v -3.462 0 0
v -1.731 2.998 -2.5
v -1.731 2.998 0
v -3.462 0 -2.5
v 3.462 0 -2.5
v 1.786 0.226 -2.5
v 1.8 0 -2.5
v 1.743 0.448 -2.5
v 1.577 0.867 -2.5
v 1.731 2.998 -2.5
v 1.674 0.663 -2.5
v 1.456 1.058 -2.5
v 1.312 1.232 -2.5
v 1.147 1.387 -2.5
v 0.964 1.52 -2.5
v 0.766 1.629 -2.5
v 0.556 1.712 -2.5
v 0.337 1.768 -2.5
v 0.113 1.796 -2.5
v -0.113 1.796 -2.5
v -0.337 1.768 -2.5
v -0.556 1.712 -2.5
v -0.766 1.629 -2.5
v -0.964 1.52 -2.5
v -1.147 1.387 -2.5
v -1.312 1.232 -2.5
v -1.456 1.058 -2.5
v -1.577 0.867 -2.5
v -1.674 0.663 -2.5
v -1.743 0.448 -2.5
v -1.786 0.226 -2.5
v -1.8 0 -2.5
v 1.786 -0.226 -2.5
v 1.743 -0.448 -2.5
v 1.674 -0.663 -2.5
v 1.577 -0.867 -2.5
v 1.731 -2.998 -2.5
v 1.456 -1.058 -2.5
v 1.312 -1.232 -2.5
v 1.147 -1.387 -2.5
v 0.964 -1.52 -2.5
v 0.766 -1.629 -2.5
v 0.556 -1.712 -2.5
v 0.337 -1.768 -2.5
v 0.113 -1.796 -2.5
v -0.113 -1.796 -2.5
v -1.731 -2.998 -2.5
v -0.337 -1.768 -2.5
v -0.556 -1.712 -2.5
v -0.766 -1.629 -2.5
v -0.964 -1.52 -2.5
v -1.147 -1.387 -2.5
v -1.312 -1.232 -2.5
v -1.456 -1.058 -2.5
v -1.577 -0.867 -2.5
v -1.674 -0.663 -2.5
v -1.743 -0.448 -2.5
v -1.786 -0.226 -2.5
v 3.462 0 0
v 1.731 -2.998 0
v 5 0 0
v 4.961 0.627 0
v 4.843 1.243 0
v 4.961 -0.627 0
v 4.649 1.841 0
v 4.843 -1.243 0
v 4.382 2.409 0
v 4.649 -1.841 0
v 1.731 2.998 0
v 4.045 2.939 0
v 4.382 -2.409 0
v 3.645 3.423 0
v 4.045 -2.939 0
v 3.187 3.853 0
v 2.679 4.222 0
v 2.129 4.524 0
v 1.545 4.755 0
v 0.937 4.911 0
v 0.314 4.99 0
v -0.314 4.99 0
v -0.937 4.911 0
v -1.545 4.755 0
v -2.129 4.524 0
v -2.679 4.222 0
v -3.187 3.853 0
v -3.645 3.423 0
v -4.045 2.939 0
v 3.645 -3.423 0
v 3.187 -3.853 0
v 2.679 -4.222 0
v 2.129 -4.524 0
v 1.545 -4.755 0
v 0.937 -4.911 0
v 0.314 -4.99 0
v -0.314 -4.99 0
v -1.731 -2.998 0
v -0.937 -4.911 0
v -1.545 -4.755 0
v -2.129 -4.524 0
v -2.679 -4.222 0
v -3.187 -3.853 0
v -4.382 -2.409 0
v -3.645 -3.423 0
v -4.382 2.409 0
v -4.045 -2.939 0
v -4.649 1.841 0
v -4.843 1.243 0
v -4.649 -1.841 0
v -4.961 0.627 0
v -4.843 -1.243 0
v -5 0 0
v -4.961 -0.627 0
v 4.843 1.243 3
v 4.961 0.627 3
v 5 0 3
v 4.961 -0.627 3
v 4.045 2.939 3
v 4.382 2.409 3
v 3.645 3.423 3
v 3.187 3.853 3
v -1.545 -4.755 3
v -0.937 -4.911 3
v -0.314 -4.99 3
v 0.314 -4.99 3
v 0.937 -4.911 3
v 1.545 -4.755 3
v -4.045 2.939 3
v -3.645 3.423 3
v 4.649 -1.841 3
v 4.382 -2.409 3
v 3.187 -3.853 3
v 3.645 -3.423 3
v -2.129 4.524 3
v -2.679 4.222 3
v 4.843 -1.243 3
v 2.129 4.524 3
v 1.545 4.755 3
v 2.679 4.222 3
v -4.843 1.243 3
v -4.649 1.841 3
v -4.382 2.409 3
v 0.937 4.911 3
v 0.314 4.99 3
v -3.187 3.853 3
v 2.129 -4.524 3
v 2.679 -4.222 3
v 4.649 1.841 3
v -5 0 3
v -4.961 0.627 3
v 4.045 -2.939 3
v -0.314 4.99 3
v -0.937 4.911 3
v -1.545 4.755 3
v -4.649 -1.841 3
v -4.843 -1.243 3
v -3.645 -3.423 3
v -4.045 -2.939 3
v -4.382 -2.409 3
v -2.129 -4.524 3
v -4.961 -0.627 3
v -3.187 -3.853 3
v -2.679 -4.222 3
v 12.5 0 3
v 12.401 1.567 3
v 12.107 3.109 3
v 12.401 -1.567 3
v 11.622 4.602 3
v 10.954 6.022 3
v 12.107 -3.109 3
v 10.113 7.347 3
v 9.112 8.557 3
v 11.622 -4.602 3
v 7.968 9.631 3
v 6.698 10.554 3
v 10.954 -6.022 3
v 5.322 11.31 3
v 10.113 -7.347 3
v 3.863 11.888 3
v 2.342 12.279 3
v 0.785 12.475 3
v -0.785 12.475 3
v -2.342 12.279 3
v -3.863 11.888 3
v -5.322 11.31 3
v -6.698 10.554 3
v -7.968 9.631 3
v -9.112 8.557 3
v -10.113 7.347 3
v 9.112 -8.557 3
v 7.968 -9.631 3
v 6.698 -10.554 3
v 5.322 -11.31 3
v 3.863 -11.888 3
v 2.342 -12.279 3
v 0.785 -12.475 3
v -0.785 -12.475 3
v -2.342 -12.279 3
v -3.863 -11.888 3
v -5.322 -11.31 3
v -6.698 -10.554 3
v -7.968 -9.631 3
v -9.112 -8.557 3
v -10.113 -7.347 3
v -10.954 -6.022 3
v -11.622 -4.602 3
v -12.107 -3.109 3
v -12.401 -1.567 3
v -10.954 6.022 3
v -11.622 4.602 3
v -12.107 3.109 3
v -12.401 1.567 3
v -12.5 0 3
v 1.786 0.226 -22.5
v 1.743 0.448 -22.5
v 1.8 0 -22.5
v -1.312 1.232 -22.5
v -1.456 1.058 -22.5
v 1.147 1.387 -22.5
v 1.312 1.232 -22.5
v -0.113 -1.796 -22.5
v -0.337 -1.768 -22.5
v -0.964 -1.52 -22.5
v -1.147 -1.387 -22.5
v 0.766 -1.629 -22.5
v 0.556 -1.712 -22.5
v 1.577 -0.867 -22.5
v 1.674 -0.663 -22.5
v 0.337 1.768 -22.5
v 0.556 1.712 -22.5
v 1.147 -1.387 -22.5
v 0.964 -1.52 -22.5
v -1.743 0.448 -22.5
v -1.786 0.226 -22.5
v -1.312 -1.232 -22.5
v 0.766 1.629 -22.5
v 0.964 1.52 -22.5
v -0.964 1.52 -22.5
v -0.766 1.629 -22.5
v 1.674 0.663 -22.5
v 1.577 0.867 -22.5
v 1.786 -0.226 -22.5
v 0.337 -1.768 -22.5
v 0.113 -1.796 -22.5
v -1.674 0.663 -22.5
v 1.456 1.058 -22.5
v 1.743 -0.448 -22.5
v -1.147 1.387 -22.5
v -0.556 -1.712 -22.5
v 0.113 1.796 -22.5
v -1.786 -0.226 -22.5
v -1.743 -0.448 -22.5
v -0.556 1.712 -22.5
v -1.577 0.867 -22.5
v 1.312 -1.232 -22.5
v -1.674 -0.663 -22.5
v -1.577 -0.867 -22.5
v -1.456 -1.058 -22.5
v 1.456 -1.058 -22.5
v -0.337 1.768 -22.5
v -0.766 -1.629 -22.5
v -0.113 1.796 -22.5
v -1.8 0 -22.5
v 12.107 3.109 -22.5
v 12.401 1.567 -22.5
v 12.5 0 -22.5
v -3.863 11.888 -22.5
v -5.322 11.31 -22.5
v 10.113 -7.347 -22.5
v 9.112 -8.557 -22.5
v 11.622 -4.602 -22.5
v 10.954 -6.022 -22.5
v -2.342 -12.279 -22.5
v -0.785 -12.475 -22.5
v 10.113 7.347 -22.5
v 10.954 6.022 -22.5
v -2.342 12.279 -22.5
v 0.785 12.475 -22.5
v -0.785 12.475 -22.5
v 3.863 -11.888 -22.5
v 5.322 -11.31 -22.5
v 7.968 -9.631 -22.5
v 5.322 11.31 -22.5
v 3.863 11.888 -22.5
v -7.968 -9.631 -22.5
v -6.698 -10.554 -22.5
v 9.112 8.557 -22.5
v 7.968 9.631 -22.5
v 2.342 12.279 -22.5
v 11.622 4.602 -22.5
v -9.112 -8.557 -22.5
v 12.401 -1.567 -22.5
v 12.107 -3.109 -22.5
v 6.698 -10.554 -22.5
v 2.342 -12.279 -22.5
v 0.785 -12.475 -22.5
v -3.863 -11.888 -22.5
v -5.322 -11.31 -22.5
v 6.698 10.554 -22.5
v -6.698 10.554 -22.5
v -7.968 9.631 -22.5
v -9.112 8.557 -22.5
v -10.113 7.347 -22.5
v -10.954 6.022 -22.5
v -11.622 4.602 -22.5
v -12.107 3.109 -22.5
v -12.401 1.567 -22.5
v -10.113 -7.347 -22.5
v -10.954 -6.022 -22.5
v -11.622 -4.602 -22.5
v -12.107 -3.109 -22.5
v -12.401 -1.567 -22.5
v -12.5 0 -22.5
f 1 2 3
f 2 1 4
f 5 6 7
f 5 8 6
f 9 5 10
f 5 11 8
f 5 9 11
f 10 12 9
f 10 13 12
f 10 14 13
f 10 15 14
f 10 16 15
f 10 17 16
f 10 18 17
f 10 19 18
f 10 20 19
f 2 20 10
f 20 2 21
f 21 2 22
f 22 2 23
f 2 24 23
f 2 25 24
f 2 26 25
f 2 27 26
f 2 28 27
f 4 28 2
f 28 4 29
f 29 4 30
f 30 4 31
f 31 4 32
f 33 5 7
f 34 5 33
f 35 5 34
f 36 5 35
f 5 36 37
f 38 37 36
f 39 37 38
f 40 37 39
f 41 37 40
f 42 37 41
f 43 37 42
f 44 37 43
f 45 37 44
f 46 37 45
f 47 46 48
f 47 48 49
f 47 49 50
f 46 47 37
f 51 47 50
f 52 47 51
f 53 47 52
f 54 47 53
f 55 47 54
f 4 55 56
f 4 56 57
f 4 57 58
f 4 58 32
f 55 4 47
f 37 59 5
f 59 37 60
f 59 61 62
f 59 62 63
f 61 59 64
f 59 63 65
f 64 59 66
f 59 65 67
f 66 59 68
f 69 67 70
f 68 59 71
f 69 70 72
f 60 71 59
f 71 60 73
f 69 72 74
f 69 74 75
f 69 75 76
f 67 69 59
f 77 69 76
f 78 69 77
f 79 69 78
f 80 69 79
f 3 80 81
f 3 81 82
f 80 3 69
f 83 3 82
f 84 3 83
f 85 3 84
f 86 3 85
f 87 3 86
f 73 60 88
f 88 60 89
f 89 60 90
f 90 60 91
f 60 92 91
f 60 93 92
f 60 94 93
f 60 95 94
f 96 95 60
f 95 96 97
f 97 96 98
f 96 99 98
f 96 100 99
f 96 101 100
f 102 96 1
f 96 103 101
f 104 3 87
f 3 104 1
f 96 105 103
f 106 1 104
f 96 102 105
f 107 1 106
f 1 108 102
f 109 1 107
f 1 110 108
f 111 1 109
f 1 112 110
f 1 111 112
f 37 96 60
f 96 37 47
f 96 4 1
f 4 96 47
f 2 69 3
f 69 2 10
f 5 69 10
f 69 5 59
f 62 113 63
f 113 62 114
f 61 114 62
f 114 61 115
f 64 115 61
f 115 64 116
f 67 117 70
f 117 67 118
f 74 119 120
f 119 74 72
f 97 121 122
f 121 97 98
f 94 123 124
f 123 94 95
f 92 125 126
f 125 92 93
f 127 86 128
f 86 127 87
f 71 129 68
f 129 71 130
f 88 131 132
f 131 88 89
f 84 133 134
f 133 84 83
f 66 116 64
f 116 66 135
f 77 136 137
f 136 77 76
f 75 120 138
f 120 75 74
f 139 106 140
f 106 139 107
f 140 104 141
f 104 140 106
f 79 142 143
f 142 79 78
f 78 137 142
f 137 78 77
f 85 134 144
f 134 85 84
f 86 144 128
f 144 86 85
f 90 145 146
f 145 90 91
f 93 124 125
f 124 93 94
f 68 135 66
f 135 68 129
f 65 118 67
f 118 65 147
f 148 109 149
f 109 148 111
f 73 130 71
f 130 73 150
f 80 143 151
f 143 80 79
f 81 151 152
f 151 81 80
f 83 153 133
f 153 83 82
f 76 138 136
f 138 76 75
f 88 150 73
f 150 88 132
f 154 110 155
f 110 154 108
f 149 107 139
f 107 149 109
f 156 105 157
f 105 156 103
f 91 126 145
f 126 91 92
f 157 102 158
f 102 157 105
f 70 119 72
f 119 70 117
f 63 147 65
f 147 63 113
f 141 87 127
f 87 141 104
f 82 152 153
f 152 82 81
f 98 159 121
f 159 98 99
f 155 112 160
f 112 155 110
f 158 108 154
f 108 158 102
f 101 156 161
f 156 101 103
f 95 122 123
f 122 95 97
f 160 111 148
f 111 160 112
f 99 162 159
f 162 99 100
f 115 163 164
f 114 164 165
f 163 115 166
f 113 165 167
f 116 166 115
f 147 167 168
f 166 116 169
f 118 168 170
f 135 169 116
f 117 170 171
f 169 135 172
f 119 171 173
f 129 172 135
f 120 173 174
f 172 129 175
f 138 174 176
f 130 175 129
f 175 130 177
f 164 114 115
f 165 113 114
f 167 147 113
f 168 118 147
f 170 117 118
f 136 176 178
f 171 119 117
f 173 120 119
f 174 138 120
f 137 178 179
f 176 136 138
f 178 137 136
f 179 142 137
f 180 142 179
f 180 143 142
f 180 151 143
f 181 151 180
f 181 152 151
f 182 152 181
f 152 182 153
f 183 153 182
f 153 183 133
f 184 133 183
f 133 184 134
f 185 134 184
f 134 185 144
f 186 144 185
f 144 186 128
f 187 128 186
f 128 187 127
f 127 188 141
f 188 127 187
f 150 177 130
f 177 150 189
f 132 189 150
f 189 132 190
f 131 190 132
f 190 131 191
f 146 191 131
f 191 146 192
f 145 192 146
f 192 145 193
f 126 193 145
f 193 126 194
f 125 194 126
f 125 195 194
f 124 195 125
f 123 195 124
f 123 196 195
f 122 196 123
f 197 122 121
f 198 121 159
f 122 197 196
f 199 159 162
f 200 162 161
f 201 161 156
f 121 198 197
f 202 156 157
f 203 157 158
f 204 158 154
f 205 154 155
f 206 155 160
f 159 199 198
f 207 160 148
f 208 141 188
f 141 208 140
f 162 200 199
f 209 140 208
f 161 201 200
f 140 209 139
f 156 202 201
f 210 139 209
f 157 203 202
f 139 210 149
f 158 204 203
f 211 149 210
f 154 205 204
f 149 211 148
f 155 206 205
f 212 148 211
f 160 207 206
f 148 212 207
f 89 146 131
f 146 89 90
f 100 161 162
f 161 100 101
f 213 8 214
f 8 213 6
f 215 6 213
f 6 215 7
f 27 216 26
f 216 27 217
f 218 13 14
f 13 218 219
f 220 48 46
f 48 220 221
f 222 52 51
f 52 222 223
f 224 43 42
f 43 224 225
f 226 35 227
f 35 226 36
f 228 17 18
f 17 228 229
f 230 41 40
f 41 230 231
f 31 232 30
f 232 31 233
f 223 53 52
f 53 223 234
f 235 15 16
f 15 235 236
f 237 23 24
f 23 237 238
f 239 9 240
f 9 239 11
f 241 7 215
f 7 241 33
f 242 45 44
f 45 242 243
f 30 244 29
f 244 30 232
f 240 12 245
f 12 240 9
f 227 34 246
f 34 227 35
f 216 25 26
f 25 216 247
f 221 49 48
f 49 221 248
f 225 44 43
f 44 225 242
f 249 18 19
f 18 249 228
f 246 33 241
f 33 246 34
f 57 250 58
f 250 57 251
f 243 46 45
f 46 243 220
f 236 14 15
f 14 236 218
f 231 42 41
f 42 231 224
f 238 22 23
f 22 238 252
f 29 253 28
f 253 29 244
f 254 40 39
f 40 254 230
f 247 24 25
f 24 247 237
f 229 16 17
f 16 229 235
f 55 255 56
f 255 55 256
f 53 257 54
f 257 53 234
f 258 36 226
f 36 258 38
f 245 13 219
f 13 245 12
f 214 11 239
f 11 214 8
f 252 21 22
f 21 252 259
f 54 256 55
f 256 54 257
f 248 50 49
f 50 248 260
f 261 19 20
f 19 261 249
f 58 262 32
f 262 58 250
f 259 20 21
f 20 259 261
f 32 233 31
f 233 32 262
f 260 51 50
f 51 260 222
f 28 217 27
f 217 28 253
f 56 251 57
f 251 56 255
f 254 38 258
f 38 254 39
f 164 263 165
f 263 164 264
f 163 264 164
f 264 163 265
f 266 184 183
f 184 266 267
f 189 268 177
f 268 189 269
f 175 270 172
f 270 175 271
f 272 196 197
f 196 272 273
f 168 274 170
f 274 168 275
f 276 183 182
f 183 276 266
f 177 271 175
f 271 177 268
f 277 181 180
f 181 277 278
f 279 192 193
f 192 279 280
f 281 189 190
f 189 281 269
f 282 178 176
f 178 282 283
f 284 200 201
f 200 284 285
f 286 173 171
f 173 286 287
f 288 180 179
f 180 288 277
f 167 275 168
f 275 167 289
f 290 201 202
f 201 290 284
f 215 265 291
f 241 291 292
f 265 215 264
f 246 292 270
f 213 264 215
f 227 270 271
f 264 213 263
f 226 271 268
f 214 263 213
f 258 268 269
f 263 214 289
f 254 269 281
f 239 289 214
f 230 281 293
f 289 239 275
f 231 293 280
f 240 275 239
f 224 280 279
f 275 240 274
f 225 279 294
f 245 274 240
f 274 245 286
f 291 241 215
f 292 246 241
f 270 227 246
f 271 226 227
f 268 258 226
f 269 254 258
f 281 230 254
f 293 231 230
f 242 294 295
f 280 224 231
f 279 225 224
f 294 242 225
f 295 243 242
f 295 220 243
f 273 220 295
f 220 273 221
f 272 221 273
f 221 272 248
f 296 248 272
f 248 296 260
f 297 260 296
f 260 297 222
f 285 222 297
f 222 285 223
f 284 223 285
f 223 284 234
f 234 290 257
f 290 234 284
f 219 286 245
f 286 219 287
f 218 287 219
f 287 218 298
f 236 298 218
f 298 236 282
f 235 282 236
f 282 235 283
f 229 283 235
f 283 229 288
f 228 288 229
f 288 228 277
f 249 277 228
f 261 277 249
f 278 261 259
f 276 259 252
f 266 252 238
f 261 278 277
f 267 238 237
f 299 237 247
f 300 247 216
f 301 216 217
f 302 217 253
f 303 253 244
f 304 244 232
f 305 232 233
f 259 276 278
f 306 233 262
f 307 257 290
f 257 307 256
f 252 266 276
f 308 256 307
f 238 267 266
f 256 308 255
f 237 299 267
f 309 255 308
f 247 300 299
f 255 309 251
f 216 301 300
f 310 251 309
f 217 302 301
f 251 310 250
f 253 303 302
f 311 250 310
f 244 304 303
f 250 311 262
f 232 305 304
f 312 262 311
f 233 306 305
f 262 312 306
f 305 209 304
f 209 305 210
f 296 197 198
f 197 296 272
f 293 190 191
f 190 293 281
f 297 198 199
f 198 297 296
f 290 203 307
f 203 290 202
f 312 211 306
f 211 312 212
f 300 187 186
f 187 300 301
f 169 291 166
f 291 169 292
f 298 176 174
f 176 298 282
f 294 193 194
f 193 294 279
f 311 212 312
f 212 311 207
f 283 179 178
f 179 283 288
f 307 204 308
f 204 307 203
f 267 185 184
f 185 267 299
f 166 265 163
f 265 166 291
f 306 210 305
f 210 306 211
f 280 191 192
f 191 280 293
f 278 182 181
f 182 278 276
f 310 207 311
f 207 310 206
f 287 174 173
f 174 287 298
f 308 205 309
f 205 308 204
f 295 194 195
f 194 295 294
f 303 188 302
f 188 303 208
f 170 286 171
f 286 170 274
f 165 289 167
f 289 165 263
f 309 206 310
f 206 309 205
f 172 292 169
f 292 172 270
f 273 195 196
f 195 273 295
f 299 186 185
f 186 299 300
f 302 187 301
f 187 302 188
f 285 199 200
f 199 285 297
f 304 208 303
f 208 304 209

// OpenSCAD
$fn = 50;

difference() {
	union() {
		translate(v = [0, 0, -22.5]) {
			cylinder(h = 25.5, r = 12.5);
		}
	}
	union() {
		translate(v = [0, 0, 0]) {
			rotate(a = [0, 0, 0]) {
				difference() {
					union() {
						translate(v = [0, 0, -2.5]) {
							linear_extrude(height = 2.5) {
								polygon(points = [[3.4619999999999997, 0.0], [1.7310000000000003, 2.9981799479017264], [-1.7309999999999992, 2.9981799479017264], [-3.4619999999999997, 4.2397272186481365e-16], [-1.7310000000000014, -2.998179947901726], [1.7309999999999977, -2.9981799479017277]]);
							}
						}
					}
					union();
				}
			}
		}
		#cylinder(h = 3, r = 5.0);
		#translate(v = [0, 0, -100.0]) {
			cylinder(h = 200, r = 1.8);
		}
	}
}
